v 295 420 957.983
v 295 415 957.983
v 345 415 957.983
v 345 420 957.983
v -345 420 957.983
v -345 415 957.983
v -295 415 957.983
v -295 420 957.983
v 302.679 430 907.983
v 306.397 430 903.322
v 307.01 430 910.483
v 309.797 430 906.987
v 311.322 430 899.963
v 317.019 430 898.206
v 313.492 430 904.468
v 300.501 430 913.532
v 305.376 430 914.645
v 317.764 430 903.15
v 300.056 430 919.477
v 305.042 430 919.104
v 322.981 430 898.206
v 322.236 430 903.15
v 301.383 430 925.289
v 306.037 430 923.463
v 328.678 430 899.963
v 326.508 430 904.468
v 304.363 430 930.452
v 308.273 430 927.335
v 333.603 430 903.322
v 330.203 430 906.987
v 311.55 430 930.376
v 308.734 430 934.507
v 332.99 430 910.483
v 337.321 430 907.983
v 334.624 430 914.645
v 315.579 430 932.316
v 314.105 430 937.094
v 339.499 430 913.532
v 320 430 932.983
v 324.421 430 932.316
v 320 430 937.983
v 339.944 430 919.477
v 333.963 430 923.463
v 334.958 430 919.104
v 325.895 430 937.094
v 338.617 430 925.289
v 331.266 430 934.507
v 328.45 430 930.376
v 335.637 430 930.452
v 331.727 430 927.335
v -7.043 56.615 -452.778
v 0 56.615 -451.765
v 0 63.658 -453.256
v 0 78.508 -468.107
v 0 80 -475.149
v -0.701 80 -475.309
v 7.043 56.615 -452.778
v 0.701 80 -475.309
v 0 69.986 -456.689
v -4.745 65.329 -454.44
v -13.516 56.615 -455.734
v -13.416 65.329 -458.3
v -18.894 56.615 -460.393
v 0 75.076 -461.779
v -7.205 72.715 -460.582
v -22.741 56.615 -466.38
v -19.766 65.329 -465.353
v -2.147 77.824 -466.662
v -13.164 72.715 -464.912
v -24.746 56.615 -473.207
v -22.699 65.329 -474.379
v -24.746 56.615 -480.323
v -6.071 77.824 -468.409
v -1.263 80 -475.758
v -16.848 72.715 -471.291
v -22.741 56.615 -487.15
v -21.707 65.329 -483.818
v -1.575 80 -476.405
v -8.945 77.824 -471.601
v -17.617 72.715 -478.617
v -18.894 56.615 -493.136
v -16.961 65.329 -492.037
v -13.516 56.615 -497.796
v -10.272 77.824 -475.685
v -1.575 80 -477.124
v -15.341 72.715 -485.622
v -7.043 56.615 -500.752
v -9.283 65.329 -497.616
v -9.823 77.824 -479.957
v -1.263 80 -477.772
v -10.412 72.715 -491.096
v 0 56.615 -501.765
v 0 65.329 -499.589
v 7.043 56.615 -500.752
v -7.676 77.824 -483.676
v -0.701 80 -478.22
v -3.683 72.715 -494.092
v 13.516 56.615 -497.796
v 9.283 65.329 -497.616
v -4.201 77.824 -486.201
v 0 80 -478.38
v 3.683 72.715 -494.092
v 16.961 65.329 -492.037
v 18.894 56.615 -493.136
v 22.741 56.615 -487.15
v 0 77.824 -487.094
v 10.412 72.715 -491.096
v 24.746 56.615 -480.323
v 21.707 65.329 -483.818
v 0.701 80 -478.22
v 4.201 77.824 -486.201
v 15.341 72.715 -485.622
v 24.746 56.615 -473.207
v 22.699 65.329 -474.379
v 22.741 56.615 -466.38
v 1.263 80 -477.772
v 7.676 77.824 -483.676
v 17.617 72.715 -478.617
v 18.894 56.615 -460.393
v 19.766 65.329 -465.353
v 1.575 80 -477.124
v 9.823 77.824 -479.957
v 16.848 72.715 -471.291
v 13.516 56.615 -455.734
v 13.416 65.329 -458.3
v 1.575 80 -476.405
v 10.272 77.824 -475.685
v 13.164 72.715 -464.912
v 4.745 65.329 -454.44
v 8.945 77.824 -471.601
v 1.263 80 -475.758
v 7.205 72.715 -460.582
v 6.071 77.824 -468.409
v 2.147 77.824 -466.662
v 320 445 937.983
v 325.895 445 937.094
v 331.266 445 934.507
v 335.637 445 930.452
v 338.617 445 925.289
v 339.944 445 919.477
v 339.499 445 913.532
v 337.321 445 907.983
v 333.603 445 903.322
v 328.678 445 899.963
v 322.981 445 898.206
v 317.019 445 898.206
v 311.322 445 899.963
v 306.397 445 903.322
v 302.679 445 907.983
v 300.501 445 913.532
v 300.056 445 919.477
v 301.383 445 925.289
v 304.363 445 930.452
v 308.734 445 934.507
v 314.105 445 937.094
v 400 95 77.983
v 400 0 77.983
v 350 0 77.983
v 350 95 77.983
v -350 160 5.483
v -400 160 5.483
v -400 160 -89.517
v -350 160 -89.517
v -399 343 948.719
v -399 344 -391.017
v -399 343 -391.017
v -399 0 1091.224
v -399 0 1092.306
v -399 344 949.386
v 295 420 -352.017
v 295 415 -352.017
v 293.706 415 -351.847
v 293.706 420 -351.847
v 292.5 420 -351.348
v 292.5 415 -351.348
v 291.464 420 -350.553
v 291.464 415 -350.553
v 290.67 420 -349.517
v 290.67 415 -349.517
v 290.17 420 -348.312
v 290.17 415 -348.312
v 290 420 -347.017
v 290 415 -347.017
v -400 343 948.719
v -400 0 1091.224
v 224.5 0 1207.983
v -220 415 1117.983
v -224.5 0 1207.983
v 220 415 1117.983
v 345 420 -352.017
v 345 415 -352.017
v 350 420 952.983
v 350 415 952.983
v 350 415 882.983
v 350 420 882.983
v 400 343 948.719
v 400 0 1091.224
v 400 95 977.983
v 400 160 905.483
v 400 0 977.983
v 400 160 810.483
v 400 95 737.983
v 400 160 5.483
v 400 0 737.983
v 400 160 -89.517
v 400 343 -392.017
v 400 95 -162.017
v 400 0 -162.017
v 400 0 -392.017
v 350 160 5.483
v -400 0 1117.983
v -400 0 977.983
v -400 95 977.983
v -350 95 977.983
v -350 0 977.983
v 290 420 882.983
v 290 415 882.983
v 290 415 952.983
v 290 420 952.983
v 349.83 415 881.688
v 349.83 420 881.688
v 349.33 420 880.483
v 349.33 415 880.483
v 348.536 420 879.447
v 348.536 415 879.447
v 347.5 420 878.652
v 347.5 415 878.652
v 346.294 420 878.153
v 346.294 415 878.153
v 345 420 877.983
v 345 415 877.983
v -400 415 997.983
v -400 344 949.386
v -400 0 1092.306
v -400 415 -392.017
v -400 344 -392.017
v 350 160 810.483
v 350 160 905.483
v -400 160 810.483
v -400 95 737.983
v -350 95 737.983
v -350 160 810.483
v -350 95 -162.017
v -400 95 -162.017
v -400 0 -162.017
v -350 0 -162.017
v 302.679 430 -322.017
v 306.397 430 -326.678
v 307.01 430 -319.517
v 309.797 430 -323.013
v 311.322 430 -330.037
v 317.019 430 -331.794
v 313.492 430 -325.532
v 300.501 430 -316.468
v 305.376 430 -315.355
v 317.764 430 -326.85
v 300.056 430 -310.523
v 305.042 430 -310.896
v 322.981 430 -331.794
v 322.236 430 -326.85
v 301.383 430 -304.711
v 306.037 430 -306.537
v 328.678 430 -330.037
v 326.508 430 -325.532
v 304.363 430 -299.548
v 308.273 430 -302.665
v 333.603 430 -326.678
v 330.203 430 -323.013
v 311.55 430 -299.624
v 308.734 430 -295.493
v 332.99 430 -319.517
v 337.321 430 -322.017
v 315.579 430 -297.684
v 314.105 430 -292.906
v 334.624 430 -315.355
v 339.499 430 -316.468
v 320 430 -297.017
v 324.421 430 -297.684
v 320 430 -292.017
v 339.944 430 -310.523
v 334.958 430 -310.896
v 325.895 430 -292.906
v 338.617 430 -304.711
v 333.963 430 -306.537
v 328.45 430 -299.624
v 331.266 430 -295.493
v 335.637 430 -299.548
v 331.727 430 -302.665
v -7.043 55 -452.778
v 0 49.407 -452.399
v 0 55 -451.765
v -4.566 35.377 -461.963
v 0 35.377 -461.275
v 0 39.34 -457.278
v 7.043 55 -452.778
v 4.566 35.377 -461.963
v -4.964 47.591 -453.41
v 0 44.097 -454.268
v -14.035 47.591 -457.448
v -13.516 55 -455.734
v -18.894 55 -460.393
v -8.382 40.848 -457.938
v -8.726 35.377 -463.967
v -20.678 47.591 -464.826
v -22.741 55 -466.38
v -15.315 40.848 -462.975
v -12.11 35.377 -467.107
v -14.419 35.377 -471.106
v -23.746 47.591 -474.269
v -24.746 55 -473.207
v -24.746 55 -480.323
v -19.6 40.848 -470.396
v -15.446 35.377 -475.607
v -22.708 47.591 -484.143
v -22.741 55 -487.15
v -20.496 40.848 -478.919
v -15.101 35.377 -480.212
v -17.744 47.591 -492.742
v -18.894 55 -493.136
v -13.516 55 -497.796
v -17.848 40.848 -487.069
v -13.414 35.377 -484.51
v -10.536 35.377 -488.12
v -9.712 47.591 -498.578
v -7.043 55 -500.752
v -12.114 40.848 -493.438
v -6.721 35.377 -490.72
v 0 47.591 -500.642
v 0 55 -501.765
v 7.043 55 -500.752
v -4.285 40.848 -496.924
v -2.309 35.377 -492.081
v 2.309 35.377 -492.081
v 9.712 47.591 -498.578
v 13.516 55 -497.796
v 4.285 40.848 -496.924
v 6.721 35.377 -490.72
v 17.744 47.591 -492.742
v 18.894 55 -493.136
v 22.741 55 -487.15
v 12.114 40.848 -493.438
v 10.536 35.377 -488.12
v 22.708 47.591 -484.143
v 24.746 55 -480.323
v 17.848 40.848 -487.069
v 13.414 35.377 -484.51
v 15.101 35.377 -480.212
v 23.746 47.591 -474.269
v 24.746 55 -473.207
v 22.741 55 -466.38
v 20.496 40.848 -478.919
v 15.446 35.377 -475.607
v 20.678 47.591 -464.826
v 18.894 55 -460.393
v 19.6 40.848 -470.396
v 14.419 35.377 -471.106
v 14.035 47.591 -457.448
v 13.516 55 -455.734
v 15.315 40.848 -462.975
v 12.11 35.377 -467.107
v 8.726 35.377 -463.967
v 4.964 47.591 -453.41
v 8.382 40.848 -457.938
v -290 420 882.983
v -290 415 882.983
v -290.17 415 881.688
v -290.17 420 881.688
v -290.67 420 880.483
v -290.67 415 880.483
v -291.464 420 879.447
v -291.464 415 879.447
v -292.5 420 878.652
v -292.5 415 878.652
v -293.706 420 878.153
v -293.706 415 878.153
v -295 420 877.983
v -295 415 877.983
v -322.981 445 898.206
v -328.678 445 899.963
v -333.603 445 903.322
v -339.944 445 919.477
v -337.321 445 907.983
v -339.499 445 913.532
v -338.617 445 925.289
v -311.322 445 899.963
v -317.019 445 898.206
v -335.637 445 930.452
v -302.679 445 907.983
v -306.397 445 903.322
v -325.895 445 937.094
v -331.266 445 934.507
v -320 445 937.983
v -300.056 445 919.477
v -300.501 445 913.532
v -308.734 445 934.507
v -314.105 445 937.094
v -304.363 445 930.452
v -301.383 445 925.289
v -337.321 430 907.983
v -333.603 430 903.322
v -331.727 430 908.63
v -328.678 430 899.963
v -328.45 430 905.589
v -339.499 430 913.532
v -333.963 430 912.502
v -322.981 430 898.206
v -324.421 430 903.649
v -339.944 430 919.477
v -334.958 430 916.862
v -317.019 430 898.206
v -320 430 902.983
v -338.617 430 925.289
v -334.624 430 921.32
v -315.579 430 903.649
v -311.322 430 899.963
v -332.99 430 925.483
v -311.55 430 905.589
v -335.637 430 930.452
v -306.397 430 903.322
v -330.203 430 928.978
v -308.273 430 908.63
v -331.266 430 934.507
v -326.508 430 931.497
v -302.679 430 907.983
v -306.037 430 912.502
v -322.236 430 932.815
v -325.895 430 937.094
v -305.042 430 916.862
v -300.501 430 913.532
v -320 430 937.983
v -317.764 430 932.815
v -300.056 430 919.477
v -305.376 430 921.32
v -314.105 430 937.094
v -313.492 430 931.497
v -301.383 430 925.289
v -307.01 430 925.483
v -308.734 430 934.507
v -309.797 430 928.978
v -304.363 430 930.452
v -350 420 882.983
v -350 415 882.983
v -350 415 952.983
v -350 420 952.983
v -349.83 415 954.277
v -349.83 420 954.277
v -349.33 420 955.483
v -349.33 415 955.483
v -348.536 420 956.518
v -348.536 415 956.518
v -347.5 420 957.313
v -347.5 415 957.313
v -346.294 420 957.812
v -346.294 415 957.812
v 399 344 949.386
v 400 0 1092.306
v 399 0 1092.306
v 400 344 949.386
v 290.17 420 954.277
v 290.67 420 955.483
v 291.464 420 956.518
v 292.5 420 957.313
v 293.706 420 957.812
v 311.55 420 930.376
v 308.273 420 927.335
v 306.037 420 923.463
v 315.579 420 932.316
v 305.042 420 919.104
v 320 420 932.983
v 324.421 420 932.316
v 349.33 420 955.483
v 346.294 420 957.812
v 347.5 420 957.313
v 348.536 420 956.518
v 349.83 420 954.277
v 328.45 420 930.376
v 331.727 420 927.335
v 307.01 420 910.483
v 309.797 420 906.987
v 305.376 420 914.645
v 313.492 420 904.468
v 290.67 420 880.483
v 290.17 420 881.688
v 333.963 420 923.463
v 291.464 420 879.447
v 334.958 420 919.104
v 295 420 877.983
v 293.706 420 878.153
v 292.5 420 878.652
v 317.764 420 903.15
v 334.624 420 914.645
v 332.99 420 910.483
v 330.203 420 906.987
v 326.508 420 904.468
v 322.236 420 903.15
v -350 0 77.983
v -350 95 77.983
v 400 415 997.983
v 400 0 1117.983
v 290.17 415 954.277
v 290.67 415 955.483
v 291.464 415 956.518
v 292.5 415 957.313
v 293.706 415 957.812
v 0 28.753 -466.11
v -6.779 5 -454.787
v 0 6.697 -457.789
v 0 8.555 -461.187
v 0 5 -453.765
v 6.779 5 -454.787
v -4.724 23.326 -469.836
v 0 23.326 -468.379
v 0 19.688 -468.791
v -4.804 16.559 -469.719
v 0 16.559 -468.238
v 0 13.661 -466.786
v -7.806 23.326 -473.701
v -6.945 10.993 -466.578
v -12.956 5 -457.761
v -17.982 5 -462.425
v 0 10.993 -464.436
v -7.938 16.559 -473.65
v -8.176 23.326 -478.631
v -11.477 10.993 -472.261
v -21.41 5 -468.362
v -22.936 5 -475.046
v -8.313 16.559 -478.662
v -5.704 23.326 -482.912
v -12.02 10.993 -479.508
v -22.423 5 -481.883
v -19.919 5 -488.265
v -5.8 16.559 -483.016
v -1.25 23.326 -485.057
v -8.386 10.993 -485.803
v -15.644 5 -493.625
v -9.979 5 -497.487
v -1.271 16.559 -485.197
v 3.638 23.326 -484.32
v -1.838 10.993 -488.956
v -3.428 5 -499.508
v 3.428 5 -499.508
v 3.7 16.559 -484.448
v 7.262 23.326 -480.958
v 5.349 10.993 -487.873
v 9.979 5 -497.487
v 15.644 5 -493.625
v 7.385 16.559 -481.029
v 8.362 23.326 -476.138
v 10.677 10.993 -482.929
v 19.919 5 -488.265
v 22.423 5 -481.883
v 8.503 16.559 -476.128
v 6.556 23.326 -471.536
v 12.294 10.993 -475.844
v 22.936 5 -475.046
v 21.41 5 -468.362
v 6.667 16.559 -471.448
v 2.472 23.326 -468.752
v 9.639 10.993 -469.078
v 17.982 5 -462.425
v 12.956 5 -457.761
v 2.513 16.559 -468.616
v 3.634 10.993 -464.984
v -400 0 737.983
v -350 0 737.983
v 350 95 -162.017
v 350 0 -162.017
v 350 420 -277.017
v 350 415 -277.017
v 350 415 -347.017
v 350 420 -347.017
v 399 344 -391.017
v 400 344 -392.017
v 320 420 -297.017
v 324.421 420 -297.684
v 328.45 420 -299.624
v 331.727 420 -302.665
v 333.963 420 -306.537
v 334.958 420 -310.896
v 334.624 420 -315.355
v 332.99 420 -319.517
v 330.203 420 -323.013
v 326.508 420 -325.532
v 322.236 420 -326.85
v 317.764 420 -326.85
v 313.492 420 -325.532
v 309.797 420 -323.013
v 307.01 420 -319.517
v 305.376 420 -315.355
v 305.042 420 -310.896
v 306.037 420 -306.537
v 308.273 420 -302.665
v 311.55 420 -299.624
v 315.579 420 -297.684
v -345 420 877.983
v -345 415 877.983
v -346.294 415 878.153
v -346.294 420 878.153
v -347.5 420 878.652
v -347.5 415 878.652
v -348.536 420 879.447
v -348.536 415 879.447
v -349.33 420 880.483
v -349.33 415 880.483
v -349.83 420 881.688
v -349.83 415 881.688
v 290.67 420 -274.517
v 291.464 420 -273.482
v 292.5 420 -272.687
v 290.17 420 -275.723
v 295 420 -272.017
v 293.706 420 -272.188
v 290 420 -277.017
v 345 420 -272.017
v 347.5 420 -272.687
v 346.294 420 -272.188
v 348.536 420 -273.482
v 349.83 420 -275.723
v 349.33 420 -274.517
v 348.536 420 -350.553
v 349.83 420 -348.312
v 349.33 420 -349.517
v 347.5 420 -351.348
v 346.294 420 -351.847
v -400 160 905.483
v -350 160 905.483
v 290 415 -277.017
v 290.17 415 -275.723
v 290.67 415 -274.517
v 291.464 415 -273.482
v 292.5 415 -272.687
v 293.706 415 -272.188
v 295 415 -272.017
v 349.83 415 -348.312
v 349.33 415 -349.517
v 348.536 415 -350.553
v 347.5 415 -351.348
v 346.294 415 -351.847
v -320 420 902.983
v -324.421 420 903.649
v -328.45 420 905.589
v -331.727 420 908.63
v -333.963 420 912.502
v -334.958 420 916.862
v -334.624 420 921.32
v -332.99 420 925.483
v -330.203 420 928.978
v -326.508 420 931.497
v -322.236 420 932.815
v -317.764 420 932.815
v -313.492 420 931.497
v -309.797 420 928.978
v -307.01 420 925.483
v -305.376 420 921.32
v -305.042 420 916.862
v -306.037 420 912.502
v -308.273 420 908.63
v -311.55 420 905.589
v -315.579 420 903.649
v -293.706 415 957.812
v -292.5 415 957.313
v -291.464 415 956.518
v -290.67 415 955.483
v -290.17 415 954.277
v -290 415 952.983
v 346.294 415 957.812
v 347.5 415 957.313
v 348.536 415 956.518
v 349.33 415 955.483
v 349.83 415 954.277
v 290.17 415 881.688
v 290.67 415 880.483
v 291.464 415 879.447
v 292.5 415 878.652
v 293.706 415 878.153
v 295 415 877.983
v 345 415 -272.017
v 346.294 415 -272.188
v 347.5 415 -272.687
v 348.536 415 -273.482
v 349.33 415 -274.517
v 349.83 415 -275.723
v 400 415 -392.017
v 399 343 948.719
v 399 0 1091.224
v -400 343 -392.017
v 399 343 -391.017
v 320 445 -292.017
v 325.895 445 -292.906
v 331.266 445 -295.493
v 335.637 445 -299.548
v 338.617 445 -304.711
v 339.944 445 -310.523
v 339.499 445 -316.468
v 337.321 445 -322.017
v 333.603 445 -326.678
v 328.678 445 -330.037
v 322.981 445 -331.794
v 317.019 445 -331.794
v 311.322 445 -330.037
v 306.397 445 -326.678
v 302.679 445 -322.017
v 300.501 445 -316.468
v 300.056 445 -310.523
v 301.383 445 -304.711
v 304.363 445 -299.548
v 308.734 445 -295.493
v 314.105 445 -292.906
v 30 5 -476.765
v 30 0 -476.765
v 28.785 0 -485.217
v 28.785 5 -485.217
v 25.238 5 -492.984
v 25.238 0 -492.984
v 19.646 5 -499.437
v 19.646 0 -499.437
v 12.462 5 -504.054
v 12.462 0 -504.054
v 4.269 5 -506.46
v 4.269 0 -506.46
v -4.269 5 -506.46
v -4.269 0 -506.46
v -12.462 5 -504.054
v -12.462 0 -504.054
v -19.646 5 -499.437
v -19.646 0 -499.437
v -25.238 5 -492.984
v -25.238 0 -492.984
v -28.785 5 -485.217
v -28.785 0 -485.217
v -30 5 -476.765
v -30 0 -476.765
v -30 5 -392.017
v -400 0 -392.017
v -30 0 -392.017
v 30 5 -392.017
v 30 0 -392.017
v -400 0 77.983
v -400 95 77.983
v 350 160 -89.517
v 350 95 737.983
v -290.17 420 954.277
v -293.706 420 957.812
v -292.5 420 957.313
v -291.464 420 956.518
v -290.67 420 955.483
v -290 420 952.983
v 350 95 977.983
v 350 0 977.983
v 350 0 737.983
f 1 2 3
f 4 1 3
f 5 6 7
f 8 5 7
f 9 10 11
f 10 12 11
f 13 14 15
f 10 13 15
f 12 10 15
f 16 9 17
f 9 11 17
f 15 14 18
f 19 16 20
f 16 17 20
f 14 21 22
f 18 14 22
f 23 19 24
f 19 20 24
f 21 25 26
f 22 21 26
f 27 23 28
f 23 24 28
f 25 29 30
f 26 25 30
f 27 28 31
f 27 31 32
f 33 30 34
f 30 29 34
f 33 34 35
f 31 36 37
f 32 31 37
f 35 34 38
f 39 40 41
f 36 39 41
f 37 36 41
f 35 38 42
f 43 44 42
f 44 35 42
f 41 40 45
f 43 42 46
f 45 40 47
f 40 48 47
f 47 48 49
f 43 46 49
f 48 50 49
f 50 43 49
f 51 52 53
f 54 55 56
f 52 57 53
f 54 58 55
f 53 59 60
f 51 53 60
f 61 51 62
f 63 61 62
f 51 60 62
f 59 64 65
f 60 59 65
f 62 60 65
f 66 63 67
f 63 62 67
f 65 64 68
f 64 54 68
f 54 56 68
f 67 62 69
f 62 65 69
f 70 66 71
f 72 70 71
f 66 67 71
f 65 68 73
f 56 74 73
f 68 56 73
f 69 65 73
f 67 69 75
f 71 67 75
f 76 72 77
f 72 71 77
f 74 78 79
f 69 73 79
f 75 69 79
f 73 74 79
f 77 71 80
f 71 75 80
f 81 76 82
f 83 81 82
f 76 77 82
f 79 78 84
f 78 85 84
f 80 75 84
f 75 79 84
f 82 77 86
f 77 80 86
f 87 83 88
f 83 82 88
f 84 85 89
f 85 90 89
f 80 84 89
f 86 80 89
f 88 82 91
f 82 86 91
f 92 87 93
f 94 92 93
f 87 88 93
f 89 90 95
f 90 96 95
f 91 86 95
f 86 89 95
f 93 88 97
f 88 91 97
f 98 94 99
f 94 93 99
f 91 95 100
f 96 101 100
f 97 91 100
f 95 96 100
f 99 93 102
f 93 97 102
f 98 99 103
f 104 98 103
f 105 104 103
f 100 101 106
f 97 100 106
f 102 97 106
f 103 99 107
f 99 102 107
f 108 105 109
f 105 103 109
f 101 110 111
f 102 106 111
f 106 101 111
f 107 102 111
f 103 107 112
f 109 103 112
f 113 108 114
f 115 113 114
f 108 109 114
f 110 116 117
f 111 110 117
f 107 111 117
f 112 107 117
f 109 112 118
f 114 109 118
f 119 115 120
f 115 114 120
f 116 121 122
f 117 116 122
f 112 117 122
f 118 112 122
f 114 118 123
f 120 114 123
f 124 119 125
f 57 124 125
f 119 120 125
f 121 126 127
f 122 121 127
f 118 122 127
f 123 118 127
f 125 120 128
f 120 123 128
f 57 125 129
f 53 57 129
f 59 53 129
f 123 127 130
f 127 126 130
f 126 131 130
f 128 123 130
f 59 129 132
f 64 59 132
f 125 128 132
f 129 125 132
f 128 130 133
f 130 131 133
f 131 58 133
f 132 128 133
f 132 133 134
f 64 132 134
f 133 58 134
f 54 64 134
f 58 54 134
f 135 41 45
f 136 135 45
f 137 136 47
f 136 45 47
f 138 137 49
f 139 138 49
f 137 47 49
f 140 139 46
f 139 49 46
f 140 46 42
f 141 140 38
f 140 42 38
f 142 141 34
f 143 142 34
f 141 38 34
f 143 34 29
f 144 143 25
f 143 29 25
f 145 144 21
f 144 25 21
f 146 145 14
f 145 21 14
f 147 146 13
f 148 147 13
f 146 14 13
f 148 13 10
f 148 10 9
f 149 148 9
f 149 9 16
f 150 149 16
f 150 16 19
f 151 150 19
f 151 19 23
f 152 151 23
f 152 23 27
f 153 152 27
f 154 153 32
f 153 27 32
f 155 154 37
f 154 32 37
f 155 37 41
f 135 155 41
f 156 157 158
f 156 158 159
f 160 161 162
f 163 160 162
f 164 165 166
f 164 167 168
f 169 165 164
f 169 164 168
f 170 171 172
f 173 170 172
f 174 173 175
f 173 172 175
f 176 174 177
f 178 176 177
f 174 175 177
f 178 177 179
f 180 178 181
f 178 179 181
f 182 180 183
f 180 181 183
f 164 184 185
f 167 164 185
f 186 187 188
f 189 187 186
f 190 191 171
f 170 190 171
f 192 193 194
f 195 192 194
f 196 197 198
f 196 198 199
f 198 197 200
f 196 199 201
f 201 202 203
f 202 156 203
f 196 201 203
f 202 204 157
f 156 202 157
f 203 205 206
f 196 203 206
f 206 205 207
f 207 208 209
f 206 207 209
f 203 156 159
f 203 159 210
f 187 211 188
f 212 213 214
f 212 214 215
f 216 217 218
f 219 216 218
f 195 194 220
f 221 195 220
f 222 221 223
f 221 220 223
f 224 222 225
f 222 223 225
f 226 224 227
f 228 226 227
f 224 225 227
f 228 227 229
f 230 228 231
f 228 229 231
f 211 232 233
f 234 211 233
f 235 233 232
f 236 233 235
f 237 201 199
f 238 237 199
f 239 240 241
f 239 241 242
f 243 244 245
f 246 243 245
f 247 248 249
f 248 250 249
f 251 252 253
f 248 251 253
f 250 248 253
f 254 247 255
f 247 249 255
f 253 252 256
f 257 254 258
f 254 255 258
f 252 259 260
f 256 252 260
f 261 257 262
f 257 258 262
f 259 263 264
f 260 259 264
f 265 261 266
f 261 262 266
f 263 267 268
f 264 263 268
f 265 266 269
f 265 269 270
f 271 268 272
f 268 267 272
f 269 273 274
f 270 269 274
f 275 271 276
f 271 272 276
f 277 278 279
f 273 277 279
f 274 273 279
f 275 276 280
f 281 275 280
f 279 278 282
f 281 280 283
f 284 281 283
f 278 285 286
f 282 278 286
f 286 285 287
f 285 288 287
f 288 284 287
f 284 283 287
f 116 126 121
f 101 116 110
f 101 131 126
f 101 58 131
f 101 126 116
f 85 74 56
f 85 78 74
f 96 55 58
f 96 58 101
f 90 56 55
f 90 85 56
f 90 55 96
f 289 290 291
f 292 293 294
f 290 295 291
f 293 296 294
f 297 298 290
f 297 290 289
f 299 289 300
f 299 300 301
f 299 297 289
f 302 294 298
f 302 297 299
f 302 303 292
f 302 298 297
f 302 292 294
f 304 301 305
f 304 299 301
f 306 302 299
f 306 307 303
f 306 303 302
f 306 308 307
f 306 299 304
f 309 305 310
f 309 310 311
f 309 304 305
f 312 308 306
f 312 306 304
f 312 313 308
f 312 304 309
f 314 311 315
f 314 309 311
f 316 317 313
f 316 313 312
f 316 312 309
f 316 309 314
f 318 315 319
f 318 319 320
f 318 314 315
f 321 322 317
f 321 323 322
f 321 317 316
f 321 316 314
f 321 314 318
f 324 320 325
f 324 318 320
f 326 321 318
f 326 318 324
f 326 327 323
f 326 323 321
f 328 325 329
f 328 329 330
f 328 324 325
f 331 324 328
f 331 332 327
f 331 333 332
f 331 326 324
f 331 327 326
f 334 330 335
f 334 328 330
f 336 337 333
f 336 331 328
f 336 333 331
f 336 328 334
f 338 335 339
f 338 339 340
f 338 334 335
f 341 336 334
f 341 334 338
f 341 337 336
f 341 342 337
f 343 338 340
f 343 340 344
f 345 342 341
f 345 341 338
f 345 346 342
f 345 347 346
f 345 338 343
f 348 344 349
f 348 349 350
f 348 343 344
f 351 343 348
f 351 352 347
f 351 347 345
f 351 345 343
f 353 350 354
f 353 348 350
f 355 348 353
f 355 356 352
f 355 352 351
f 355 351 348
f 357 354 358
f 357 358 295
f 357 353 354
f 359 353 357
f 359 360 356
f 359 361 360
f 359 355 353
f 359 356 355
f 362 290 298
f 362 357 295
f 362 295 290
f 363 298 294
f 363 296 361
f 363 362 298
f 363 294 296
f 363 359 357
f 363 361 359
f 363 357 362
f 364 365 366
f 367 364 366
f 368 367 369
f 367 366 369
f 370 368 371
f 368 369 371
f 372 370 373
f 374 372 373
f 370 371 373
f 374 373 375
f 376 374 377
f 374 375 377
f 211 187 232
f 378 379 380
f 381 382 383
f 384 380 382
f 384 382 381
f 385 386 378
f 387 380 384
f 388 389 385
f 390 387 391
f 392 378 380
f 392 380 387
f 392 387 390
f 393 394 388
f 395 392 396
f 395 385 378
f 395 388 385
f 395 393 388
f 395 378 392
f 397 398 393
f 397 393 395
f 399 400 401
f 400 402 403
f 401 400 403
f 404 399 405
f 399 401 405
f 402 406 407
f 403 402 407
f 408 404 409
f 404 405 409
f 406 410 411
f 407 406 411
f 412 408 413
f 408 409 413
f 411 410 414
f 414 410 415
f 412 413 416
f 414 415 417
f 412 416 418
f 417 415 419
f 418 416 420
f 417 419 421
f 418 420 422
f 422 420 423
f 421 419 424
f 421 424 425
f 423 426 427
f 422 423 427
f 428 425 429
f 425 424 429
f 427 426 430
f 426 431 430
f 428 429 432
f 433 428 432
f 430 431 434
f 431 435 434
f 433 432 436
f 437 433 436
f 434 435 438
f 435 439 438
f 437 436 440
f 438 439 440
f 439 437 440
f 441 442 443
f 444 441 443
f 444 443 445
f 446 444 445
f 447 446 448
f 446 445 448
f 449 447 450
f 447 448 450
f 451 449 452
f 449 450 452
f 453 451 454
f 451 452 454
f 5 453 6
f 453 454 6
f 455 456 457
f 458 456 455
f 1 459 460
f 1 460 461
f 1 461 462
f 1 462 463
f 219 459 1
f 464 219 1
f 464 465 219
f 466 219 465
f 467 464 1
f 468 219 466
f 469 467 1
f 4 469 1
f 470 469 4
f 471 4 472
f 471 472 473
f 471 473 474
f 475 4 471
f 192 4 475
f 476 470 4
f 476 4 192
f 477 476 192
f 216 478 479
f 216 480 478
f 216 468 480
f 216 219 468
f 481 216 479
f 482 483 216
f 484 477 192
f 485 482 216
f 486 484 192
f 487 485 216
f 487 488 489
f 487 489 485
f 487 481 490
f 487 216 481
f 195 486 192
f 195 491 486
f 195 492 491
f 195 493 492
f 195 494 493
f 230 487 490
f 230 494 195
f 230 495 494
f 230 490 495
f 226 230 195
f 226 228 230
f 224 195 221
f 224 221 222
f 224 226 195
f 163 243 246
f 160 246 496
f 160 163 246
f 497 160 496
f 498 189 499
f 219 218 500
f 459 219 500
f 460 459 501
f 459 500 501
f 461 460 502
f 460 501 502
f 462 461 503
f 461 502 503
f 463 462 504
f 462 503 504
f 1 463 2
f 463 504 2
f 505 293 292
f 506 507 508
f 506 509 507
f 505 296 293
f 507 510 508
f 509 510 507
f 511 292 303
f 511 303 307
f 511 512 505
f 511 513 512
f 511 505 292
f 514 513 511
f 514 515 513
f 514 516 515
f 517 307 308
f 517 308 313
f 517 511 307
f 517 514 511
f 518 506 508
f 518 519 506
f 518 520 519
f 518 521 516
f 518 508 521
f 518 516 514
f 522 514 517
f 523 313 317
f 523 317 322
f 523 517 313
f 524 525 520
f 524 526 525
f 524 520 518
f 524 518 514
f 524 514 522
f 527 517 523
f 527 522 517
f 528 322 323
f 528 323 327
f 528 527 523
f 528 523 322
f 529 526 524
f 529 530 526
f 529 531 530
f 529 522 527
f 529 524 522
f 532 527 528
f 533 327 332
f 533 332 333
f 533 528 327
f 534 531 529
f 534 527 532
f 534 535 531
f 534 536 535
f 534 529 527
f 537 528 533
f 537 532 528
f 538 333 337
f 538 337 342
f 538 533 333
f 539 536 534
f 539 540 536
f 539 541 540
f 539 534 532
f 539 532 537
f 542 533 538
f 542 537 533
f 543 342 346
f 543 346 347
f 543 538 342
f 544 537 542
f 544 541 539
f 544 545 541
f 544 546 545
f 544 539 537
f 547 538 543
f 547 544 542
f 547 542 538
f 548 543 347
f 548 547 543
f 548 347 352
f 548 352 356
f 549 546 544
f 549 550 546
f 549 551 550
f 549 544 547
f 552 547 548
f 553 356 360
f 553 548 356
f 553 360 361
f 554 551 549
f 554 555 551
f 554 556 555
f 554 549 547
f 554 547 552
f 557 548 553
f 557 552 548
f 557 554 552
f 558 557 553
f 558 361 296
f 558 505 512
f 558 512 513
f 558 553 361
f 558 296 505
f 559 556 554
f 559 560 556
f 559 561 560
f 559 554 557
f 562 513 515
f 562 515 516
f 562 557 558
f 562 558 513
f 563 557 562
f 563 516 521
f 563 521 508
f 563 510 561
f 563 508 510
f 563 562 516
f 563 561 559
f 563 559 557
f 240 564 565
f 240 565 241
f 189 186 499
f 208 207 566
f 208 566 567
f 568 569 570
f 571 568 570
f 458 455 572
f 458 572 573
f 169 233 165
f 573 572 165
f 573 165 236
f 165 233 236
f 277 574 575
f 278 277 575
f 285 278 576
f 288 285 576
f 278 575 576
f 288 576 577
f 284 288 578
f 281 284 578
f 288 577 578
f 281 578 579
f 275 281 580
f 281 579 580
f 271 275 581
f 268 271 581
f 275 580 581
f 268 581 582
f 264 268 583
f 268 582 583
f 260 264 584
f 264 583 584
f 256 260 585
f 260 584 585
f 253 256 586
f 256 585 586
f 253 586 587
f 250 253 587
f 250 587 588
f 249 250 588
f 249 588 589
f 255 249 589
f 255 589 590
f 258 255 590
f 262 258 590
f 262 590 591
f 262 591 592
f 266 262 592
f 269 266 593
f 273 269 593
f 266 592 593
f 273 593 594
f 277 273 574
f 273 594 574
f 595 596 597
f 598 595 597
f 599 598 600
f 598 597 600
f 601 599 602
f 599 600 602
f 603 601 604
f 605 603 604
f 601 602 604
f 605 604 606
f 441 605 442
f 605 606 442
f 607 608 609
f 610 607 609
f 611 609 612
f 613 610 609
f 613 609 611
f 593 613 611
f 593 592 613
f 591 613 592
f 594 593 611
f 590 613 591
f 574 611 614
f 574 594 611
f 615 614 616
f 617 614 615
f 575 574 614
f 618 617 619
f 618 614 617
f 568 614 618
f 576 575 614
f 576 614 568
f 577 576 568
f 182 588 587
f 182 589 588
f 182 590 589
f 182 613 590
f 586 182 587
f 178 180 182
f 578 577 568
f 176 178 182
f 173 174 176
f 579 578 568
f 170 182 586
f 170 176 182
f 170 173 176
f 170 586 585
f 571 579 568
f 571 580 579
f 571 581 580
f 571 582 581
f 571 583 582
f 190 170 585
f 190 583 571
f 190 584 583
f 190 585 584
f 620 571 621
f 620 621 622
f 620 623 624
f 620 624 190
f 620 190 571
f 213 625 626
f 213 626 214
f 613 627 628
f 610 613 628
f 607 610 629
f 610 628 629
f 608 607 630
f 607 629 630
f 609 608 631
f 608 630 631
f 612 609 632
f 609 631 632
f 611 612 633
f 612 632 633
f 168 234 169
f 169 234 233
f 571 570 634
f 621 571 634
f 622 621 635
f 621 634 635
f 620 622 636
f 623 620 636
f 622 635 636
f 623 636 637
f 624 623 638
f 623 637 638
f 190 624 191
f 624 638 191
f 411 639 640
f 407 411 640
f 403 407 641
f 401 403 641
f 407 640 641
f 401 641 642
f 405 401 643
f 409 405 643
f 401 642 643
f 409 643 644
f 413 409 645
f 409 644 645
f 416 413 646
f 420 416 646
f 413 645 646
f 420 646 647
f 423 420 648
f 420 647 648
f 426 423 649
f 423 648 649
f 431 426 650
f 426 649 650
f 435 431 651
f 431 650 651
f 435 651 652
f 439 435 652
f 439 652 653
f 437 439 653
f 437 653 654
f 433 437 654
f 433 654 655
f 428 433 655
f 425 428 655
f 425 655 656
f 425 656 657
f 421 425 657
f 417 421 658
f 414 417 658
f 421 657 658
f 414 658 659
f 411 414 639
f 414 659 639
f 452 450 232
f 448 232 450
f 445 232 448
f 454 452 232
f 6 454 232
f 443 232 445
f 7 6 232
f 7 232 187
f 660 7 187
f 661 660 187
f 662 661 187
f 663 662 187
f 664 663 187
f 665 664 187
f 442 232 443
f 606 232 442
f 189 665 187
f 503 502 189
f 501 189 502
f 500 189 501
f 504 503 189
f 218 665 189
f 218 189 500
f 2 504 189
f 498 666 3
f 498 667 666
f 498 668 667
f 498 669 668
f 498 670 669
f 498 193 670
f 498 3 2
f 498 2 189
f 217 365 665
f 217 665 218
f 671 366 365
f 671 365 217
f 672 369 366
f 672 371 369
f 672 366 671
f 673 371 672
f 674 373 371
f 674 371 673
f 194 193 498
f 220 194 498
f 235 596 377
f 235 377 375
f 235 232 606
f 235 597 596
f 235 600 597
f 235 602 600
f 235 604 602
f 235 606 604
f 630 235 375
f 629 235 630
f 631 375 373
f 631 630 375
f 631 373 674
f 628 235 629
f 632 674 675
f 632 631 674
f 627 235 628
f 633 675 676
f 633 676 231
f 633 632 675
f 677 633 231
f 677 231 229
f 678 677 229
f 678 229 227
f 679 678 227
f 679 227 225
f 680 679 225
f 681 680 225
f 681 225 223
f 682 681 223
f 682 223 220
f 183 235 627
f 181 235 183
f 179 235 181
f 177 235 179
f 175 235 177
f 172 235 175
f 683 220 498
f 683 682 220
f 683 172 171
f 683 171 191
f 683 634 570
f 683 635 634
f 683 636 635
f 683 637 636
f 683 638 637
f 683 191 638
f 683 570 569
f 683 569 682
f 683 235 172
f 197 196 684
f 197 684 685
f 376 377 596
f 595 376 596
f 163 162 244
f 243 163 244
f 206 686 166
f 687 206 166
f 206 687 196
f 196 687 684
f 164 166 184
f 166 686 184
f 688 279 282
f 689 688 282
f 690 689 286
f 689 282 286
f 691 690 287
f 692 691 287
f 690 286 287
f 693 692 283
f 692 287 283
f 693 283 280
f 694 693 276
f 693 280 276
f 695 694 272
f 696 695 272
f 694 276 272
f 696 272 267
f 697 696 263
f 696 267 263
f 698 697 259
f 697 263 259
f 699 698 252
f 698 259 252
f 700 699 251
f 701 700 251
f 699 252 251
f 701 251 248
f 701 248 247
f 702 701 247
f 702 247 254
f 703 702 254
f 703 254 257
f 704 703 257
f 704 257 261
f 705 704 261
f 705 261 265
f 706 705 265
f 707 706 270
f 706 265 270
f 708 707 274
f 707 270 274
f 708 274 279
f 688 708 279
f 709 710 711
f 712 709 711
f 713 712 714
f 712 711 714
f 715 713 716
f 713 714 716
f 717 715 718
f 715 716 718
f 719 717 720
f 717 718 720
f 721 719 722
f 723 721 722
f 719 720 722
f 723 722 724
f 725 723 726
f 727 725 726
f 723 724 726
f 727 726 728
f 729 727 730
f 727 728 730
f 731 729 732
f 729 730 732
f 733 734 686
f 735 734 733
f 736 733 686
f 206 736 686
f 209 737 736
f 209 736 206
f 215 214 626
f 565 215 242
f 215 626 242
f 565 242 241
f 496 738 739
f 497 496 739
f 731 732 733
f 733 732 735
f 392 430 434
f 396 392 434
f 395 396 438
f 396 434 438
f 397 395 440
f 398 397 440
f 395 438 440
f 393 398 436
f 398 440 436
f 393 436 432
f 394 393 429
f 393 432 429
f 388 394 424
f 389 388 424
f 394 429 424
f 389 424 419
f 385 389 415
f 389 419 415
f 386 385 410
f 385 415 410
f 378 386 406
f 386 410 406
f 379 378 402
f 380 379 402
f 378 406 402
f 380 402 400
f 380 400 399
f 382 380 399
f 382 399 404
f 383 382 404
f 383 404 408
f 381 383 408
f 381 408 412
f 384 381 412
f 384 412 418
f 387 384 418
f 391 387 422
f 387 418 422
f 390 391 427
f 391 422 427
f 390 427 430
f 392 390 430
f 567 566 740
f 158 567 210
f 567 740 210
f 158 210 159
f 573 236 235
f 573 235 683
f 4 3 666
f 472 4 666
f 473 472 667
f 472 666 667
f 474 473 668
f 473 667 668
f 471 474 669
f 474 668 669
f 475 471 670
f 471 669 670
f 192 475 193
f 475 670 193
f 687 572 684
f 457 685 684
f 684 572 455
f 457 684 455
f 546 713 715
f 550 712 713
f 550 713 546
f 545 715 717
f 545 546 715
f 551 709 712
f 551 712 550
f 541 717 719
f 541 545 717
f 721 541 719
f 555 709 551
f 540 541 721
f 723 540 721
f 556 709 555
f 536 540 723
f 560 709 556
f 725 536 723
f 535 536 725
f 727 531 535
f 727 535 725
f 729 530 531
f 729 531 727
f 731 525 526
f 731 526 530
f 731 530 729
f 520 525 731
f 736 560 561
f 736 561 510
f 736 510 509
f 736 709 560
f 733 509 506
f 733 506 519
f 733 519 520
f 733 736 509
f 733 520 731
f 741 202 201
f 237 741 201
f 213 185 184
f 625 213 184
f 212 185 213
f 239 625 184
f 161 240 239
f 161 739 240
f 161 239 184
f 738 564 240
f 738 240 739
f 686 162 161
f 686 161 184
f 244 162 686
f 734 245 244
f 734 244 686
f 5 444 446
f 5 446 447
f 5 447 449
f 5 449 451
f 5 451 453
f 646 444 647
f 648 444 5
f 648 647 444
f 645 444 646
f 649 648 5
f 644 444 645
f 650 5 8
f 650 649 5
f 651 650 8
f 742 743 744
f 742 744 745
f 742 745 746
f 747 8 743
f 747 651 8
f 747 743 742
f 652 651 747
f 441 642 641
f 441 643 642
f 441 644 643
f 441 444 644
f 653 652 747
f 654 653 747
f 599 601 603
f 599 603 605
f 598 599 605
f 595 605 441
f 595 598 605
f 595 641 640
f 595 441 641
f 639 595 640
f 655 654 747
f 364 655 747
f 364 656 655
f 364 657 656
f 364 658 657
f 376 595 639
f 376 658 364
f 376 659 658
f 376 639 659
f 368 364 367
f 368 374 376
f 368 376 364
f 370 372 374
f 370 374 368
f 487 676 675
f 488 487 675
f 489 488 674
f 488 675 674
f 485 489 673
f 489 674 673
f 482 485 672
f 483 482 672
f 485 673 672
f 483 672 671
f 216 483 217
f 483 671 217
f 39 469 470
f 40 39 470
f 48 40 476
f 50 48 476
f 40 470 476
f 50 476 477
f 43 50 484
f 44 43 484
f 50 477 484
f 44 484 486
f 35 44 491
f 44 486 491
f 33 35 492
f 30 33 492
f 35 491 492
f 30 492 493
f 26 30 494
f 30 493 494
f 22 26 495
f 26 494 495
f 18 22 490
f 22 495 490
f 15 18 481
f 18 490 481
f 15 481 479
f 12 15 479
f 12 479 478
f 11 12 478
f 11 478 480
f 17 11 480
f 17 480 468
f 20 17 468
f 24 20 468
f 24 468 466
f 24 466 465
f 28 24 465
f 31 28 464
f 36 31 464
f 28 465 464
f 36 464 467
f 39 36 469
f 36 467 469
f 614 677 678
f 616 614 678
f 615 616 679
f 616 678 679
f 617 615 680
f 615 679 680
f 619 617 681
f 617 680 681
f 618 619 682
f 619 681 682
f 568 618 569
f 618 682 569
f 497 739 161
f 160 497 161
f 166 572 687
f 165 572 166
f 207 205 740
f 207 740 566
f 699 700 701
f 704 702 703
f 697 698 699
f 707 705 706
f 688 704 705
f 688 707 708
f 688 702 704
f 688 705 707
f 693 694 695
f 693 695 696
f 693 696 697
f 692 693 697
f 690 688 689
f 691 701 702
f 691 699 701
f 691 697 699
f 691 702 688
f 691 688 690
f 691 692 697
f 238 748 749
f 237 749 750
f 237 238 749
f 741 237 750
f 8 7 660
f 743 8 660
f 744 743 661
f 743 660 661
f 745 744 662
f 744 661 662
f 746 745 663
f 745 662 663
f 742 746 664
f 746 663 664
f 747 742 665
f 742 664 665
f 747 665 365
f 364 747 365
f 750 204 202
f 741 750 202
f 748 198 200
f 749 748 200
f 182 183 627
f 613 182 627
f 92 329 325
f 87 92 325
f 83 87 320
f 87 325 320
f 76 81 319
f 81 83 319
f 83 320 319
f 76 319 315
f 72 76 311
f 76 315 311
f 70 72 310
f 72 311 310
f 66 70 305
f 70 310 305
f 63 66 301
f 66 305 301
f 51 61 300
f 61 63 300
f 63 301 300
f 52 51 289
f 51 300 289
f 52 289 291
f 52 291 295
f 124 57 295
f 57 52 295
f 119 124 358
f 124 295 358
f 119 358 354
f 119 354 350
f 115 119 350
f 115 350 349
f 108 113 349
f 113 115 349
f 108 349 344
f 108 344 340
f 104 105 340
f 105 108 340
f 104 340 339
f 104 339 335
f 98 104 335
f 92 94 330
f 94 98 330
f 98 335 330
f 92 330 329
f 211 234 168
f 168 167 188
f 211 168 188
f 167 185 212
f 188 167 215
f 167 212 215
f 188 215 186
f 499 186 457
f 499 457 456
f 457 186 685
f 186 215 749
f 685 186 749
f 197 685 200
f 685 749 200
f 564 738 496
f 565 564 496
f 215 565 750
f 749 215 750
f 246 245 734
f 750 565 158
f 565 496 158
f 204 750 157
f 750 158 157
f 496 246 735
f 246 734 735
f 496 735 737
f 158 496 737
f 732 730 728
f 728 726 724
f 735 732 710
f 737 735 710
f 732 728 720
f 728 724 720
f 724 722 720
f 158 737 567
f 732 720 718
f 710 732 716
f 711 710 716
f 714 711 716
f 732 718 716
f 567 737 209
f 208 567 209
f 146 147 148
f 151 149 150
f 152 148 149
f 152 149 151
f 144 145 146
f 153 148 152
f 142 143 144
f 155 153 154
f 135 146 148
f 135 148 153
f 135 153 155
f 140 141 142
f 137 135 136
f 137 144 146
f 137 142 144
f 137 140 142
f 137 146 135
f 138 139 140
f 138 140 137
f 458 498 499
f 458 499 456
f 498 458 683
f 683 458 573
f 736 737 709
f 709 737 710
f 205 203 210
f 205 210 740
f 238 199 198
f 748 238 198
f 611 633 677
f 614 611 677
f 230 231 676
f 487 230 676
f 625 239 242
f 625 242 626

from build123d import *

# Parameters (mm, degrees)
CROQUIS1_W              = 800
CROQUIS1_H              = 1600
SALIENTE_EXTRUIR1_DEPTH = 415
CORTAR_EXTRUIR1_DEPTH   = 200
CORTAR_EXTRUIR2_DEPTH   = 200
CORTAR_EXTRUIR6_DEPTH   = 499
CORTAR_EXTRUIR8_DEPTH   = 359
CORTAR_EXTRUIR10_DEPTH  = 353
CORTAR_EXTRUIR12_DEPTH  = 514
CORTAR_EXTRUIR13_DEPTH  = 514
CORTAR_EXTRUIR16_DEPTH  = 50
CORTAR_EXTRUIR17_DEPTH  = 50
CORTAR_EXTRUIR18_DEPTH  = 1
CROQUIS20_W             = 800
CROQUIS20_H             = 1
CORTAR_EXTRUIR19_DEPTH  = 1
SALIENTE_EXTRUIR2_DEPTH = 5
CROQUIS22_R             = 15
SALIENTE_EXTRUIR3_DEPTH = 10
CROQUIS23_R             = 20
SALIENTE_EXTRUIR4_DEPTH = 15
SALIENTE_EXTRUIR5_DEPTH = 5
CROQUIS26_R             = 25
SALIENTE_EXTRUIR6_DEPTH = 75


with BuildPart() as part:
    # Croquis1 → Saliente-Extruir1 (new body)
    with BuildSketch(Plane(origin=(0, 0, 0), x_dir=(1, 0, 0), z_dir=(0, 1, 0))):
        with Locations((0, -407.98258177)):
            Rectangle(CROQUIS1_W, CROQUIS1_H)
    extrude(amount=SALIENTE_EXTRUIR1_DEPTH)

    # Croquis3 → Cortar-Extruir1 (cut)
    with BuildSketch(Plane(origin=(604.100569287, 262.019524028, 906.150853931), x_dir=(-0.8421068082275548, 0.1498081502111445, 0.5180865194802076), z_dir=(-0.5393107856670403, -0.23391793113269235, -0.8089661785005605))):
        Polygon((456.118589156, 88.118028239), (242.368981337, -310.549885139), (242.368981337, 121.451272267), align=None)
    extrude(amount=-CORTAR_EXTRUIR1_DEPTH, mode=Mode.SUBTRACT)

    # Croquis5 → Cortar-Extruir2 (cut)
    with BuildSketch(Plane(origin=(-604.100569287, 262.019524028, 906.150853931), x_dir=(-0.8421068082275548, -0.1498081502111445, -0.5180865194802076), z_dir=(0.5393107856670404, -0.2339179311326923, -0.8089661785005605))):
        Polygon((-242.368981337, -310.549885139), (-242.368981337, 121.451272267), (-456.118589156, 88.118028239), align=None)
    extrude(amount=-CORTAR_EXTRUIR2_DEPTH, mode=Mode.SUBTRACT)

    # Croquis8 → Cortar-Extruir6 (cut)
    with BuildSketch(Plane(origin=(0, 250.204627362, 1153.721337281), x_dir=(-1, 0, 0), z_dir=(0, -0.21194078521367435, -0.9772825095963864))):
        Polygon((220, 168.626135247), (400, -256.020776905), (-400, -256.020776905), (-220, 168.626135247), (0, 168.626135247), align=None)
    extrude(amount=-CORTAR_EXTRUIR6_DEPTH, mode=Mode.SUBTRACT)

    # Croquis12 → Cortar-Extruir8 (cut)
    with BuildSketch(Plane.XY.offset(1117.98258177)):
        Polygon((220, 415), (400, 0), (400, 415), align=None)
    extrude(amount=CORTAR_EXTRUIR8_DEPTH, mode=Mode.SUBTRACT)

    # Croquis14 → Cortar-Extruir10 (cut)
    with BuildSketch(Plane.XY.offset(1117.98258177)):
        Polygon((-220, 415), (-400, 0), (-400, 415), align=None)
    extrude(amount=CORTAR_EXTRUIR10_DEPTH, mode=Mode.SUBTRACT)

    # Croquis15 → Cortar-Extruir12 (cut)
    with BuildSketch(Plane(origin=(516.98244579, 224.233349981, 1008.11576929), x_dir=(-0.8942171635698928, 0.0971910742249457, 0.4369548712029846), z_dir=(-0.44763340400043405, -0.19415424751826063, -0.8728851378008463))):
        Polygon((327.082120211, -262.279632659), (130.821069596, -242.738649788), (332.114454842, 162.361304614), align=None)
    extrude(amount=-CORTAR_EXTRUIR12_DEPTH, mode=Mode.SUBTRACT)


with BuildPart() as body_2:
    # of the pieces the cut leaves, the one that is kept (cortar_extruir12_keep)
    add(part.part.solids().sort_by_distance((-400, 0, 1207.98258177))[0])

    # Croquis16 → Cortar-Extruir13 (cut)
    with BuildSketch(Plane(origin=(-516.98244579, 224.233349981, 1008.11576929), x_dir=(-0.8942171635698928, -0.09719107422494568, -0.43695487120298454), z_dir=(0.44763340400043394, -0.19415424751826066, -0.8728851378008463))):
        Polygon((-327.082120211, -262.279632659), (-332.114454842, 162.361304614), (-130.821069596, -242.738649788), align=None)
    extrude(amount=-CORTAR_EXTRUIR13_DEPTH, mode=Mode.SUBTRACT)


with BuildPart() as body_2_2:
    # of the pieces the cut leaves, the one that is kept (cortar_extruir13_keep)
    add(body_2.part.solids().sort_by_distance((224.5, 0, 1207.98258177))[0])

    # Croquis17 → Cortar-Extruir16 (cut)
    with BuildSketch(Plane(origin=(400, 0, 0), x_dir=(0, 0, -1), z_dir=(1, 0, 0))):
        Polygon((162.01741823, 0), (-77.98258177, 0), (-77.98258177, 95), (-5.48258177, 160), (89.51741823, 160), (162.01741823, 95), align=None)
        Polygon((-977.98258177, 0), (-737.98258177, 0), (-737.98258177, 95), (-810.48258177, 160), (-905.48258177, 160), (-977.98258177, 95), align=None)
    extrude(amount=-CORTAR_EXTRUIR16_DEPTH, mode=Mode.SUBTRACT)

    # Croquis18 → Cortar-Extruir17 (cut)
    with BuildSketch(Plane.ZY.offset(400)):
        Polygon((-162.01741823, 0), (77.98258177, 0), (77.98258177, 95), (5.48258177, 160), (-89.51741823, 160), (-162.01741823, 95), align=None)
        Polygon((977.98258177, 0), (737.98258177, 0), (737.98258177, 95), (810.48258177, 160), (905.48258177, 160), (977.98258177, 95), align=None)
    extrude(amount=-CORTAR_EXTRUIR17_DEPTH, mode=Mode.SUBTRACT)

    # Croquis19 → Cortar-Extruir18 (cut)
    with BuildSketch(Plane(origin=(400, 0, 0), x_dir=(0, 0, -1), z_dir=(1, 0, 0))):
        Polygon((392.01741823, 343), (-948.718987098, 343), (-1091.223533976, 0), (-1092.306405756, 0), (-949.386393727, 344), (392.01741823, 344), align=None)
    cortar_extruir18 = extrude(amount=-CORTAR_EXTRUIR18_DEPTH, mode=Mode.SUBTRACT)

    # Croquis20 → Cortar-Extruir19 (cut)
    with BuildSketch(Plane(origin=(0, 0, -392.01741823), x_dir=(-1, 0, 0), z_dir=(0, 0, -1))):
        with Locations((0, 343.5)):
            Rectangle(CROQUIS20_W, CROQUIS20_H)
    extrude(amount=-CORTAR_EXTRUIR19_DEPTH, mode=Mode.SUBTRACT)

    # Simetría1: Cortar-Extruir18 across plane
    add(cortar_extruir18.mirror(Plane.ZY), mode=Mode.SUBTRACT)

    # Croquis21 → Saliente-Extruir2 (add)
    with BuildSketch(Plane(origin=(0, 415, 0), x_dir=(1, 0, 0), z_dir=(0, 1, 0))):
        with BuildLine():
            Line((295, 272.01741823), (345, 272.01741823))
            ThreePointArc((345, 272.01741823), (348.535533906, 273.481884325), (350, 277.01741823))
            Line((350, 277.01741823), (350, 347.01741823))
            ThreePointArc((350, 347.01741823), (348.535533906, 350.552952136), (345, 352.01741823))
            Line((345, 352.01741823), (295, 352.01741823))
            ThreePointArc((295, 352.01741823), (291.464466094, 350.552952136), (290, 347.01741823))
            Line((290, 347.01741823), (290, 277.01741823))
            ThreePointArc((290, 277.01741823), (291.464466094, 273.481884325), (295, 272.01741823))
        make_face()
        with BuildLine():
            Line((290, -882.98258177), (290, -952.98258177))
            ThreePointArc((290, -952.98258177), (291.464466094, -956.518115675), (295, -957.98258177))
            Line((295, -957.98258177), (345, -957.98258177))
            ThreePointArc((345, -957.98258177), (348.535533906, -956.518115675), (350, -952.98258177))
            Line((350, -952.98258177), (350, -882.98258177))
            ThreePointArc((350, -882.98258177), (348.535533906, -879.447047864), (345, -877.98258177))
            Line((345, -877.98258177), (295, -877.98258177))
            ThreePointArc((295, -877.98258177), (291.464466094, -879.447047864), (290, -882.98258177))
        make_face()
        with BuildLine():
            Line((-295, -877.98258177), (-345, -877.98258177))
            ThreePointArc((-345, -877.98258177), (-348.535533906, -879.447047864), (-350, -882.98258177))
            Line((-350, -882.98258177), (-350, -952.98258177))
            ThreePointArc((-350, -952.98258177), (-348.535533906, -956.518115675), (-345, -957.98258177))
            Line((-345, -957.98258177), (-295, -957.98258177))
            ThreePointArc((-295, -957.98258177), (-291.464466094, -956.518115675), (-290, -952.98258177))
            Line((-290, -952.98258177), (-290, -882.98258177))
            ThreePointArc((-290, -882.98258177), (-291.464466094, -879.447047864), (-295, -877.98258177))
        make_face()
    extrude(amount=SALIENTE_EXTRUIR2_DEPTH)

    # Croquis22 → Saliente-Extruir3 (add)
    with BuildSketch(Plane(origin=(0, 420, 0), x_dir=(1, 0, 0), z_dir=(0, 1, 0))):
        with Locations((320, 312.01741823)):
            Circle(CROQUIS22_R)
        with Locations((320, -917.98258177)):
            Circle(CROQUIS22_R)
        with Locations((-320, -917.98258177)):
            Circle(CROQUIS22_R)
    extrude(amount=SALIENTE_EXTRUIR3_DEPTH)

    # Croquis23 → Saliente-Extruir4 (add)
    with BuildSketch(Plane(origin=(0, 430, 0), x_dir=(1, 0, 0), z_dir=(0, 1, 0))):
        with Locations((320, 312.01741823)):
            Circle(CROQUIS23_R)
        with Locations((320, -917.98258177)):
            Circle(CROQUIS23_R)
        with Locations((-320, -917.98258177)):
            Circle(CROQUIS23_R)
    extrude(amount=SALIENTE_EXTRUIR4_DEPTH)

    # Croquis25 → Saliente-Extruir5 (add)
    with BuildSketch(Plane.XZ):
        with BuildLine():
            Line((-30, -476.764876907), (-30, -392.01741823))
            Line((-30, -392.01741823), (30, -392.01741823))
            Line((30, -392.01741823), (30, -476.764876907))
            ThreePointArc((30, -476.764876907), (0, -506.764876907), (-30, -476.764876907))
        make_face()
    extrude(amount=-SALIENTE_EXTRUIR5_DEPTH)

    # Croquis26 → Saliente-Extruir6 (add)
    with BuildSketch(Plane(origin=(0, 5, 0), x_dir=(1, 0, 0), z_dir=(0, 1, 0))):
        with Locations((0, 476.764876907)):
            Circle(CROQUIS26_R)
    extrude(amount=SALIENTE_EXTRUIR6_DEPTH)

    # Croquis28 → Cortar-Revolución7 (revolve, cut)
    with BuildSketch(Plane.ZY):
        with BuildLine():
            Line((-451.764876907, 5), (-451.764876907, 55))
            ThreePointArc((-451.764876907, 55), (-454.267783945, 44.096752398), (-461.275341569, 35.376690009))
            add(Edge.make_bspline(
                [(-461.275341569, 35.376690009), (-479.429840017, 14.56995995), (-453.764876907, 5)],
                knots=[0, 0, 0, 1, 1, 1], degree=2))
            Line((-453.764876907, 5), (-451.764876907, 5))
        make_face()
    revolve(axis=Axis((0, 90.386786237, -476.764876907), (0, -1, 0)), mode=Mode.SUBTRACT)

    # Croquis29 → Cortar-Revolución26 (revolve, cut)
    with BuildSketch(Plane.ZY):
        with BuildLine():
            Line((-475.149447102, 80), (-475.149447102, 84.514502028))
            Line((-475.149447102, 84.514502028), (-446.334832781, 84.514502028))
            Line((-446.334832781, 84.514502028), (-446.334832781, 57.478552518))
            Line((-446.334832781, 57.478552518), (-451.764876907, 56.615429804))
            ThreePointArc((-451.764876907, 56.615429804), (-459.050340313, 72.714536594), (-475.149447102, 80))
        make_face()
    revolve(axis=Axis((0, 80, -476.764876907), (0, -1, 0)), mode=Mode.SUBTRACT)


solid = body_2_2.part
